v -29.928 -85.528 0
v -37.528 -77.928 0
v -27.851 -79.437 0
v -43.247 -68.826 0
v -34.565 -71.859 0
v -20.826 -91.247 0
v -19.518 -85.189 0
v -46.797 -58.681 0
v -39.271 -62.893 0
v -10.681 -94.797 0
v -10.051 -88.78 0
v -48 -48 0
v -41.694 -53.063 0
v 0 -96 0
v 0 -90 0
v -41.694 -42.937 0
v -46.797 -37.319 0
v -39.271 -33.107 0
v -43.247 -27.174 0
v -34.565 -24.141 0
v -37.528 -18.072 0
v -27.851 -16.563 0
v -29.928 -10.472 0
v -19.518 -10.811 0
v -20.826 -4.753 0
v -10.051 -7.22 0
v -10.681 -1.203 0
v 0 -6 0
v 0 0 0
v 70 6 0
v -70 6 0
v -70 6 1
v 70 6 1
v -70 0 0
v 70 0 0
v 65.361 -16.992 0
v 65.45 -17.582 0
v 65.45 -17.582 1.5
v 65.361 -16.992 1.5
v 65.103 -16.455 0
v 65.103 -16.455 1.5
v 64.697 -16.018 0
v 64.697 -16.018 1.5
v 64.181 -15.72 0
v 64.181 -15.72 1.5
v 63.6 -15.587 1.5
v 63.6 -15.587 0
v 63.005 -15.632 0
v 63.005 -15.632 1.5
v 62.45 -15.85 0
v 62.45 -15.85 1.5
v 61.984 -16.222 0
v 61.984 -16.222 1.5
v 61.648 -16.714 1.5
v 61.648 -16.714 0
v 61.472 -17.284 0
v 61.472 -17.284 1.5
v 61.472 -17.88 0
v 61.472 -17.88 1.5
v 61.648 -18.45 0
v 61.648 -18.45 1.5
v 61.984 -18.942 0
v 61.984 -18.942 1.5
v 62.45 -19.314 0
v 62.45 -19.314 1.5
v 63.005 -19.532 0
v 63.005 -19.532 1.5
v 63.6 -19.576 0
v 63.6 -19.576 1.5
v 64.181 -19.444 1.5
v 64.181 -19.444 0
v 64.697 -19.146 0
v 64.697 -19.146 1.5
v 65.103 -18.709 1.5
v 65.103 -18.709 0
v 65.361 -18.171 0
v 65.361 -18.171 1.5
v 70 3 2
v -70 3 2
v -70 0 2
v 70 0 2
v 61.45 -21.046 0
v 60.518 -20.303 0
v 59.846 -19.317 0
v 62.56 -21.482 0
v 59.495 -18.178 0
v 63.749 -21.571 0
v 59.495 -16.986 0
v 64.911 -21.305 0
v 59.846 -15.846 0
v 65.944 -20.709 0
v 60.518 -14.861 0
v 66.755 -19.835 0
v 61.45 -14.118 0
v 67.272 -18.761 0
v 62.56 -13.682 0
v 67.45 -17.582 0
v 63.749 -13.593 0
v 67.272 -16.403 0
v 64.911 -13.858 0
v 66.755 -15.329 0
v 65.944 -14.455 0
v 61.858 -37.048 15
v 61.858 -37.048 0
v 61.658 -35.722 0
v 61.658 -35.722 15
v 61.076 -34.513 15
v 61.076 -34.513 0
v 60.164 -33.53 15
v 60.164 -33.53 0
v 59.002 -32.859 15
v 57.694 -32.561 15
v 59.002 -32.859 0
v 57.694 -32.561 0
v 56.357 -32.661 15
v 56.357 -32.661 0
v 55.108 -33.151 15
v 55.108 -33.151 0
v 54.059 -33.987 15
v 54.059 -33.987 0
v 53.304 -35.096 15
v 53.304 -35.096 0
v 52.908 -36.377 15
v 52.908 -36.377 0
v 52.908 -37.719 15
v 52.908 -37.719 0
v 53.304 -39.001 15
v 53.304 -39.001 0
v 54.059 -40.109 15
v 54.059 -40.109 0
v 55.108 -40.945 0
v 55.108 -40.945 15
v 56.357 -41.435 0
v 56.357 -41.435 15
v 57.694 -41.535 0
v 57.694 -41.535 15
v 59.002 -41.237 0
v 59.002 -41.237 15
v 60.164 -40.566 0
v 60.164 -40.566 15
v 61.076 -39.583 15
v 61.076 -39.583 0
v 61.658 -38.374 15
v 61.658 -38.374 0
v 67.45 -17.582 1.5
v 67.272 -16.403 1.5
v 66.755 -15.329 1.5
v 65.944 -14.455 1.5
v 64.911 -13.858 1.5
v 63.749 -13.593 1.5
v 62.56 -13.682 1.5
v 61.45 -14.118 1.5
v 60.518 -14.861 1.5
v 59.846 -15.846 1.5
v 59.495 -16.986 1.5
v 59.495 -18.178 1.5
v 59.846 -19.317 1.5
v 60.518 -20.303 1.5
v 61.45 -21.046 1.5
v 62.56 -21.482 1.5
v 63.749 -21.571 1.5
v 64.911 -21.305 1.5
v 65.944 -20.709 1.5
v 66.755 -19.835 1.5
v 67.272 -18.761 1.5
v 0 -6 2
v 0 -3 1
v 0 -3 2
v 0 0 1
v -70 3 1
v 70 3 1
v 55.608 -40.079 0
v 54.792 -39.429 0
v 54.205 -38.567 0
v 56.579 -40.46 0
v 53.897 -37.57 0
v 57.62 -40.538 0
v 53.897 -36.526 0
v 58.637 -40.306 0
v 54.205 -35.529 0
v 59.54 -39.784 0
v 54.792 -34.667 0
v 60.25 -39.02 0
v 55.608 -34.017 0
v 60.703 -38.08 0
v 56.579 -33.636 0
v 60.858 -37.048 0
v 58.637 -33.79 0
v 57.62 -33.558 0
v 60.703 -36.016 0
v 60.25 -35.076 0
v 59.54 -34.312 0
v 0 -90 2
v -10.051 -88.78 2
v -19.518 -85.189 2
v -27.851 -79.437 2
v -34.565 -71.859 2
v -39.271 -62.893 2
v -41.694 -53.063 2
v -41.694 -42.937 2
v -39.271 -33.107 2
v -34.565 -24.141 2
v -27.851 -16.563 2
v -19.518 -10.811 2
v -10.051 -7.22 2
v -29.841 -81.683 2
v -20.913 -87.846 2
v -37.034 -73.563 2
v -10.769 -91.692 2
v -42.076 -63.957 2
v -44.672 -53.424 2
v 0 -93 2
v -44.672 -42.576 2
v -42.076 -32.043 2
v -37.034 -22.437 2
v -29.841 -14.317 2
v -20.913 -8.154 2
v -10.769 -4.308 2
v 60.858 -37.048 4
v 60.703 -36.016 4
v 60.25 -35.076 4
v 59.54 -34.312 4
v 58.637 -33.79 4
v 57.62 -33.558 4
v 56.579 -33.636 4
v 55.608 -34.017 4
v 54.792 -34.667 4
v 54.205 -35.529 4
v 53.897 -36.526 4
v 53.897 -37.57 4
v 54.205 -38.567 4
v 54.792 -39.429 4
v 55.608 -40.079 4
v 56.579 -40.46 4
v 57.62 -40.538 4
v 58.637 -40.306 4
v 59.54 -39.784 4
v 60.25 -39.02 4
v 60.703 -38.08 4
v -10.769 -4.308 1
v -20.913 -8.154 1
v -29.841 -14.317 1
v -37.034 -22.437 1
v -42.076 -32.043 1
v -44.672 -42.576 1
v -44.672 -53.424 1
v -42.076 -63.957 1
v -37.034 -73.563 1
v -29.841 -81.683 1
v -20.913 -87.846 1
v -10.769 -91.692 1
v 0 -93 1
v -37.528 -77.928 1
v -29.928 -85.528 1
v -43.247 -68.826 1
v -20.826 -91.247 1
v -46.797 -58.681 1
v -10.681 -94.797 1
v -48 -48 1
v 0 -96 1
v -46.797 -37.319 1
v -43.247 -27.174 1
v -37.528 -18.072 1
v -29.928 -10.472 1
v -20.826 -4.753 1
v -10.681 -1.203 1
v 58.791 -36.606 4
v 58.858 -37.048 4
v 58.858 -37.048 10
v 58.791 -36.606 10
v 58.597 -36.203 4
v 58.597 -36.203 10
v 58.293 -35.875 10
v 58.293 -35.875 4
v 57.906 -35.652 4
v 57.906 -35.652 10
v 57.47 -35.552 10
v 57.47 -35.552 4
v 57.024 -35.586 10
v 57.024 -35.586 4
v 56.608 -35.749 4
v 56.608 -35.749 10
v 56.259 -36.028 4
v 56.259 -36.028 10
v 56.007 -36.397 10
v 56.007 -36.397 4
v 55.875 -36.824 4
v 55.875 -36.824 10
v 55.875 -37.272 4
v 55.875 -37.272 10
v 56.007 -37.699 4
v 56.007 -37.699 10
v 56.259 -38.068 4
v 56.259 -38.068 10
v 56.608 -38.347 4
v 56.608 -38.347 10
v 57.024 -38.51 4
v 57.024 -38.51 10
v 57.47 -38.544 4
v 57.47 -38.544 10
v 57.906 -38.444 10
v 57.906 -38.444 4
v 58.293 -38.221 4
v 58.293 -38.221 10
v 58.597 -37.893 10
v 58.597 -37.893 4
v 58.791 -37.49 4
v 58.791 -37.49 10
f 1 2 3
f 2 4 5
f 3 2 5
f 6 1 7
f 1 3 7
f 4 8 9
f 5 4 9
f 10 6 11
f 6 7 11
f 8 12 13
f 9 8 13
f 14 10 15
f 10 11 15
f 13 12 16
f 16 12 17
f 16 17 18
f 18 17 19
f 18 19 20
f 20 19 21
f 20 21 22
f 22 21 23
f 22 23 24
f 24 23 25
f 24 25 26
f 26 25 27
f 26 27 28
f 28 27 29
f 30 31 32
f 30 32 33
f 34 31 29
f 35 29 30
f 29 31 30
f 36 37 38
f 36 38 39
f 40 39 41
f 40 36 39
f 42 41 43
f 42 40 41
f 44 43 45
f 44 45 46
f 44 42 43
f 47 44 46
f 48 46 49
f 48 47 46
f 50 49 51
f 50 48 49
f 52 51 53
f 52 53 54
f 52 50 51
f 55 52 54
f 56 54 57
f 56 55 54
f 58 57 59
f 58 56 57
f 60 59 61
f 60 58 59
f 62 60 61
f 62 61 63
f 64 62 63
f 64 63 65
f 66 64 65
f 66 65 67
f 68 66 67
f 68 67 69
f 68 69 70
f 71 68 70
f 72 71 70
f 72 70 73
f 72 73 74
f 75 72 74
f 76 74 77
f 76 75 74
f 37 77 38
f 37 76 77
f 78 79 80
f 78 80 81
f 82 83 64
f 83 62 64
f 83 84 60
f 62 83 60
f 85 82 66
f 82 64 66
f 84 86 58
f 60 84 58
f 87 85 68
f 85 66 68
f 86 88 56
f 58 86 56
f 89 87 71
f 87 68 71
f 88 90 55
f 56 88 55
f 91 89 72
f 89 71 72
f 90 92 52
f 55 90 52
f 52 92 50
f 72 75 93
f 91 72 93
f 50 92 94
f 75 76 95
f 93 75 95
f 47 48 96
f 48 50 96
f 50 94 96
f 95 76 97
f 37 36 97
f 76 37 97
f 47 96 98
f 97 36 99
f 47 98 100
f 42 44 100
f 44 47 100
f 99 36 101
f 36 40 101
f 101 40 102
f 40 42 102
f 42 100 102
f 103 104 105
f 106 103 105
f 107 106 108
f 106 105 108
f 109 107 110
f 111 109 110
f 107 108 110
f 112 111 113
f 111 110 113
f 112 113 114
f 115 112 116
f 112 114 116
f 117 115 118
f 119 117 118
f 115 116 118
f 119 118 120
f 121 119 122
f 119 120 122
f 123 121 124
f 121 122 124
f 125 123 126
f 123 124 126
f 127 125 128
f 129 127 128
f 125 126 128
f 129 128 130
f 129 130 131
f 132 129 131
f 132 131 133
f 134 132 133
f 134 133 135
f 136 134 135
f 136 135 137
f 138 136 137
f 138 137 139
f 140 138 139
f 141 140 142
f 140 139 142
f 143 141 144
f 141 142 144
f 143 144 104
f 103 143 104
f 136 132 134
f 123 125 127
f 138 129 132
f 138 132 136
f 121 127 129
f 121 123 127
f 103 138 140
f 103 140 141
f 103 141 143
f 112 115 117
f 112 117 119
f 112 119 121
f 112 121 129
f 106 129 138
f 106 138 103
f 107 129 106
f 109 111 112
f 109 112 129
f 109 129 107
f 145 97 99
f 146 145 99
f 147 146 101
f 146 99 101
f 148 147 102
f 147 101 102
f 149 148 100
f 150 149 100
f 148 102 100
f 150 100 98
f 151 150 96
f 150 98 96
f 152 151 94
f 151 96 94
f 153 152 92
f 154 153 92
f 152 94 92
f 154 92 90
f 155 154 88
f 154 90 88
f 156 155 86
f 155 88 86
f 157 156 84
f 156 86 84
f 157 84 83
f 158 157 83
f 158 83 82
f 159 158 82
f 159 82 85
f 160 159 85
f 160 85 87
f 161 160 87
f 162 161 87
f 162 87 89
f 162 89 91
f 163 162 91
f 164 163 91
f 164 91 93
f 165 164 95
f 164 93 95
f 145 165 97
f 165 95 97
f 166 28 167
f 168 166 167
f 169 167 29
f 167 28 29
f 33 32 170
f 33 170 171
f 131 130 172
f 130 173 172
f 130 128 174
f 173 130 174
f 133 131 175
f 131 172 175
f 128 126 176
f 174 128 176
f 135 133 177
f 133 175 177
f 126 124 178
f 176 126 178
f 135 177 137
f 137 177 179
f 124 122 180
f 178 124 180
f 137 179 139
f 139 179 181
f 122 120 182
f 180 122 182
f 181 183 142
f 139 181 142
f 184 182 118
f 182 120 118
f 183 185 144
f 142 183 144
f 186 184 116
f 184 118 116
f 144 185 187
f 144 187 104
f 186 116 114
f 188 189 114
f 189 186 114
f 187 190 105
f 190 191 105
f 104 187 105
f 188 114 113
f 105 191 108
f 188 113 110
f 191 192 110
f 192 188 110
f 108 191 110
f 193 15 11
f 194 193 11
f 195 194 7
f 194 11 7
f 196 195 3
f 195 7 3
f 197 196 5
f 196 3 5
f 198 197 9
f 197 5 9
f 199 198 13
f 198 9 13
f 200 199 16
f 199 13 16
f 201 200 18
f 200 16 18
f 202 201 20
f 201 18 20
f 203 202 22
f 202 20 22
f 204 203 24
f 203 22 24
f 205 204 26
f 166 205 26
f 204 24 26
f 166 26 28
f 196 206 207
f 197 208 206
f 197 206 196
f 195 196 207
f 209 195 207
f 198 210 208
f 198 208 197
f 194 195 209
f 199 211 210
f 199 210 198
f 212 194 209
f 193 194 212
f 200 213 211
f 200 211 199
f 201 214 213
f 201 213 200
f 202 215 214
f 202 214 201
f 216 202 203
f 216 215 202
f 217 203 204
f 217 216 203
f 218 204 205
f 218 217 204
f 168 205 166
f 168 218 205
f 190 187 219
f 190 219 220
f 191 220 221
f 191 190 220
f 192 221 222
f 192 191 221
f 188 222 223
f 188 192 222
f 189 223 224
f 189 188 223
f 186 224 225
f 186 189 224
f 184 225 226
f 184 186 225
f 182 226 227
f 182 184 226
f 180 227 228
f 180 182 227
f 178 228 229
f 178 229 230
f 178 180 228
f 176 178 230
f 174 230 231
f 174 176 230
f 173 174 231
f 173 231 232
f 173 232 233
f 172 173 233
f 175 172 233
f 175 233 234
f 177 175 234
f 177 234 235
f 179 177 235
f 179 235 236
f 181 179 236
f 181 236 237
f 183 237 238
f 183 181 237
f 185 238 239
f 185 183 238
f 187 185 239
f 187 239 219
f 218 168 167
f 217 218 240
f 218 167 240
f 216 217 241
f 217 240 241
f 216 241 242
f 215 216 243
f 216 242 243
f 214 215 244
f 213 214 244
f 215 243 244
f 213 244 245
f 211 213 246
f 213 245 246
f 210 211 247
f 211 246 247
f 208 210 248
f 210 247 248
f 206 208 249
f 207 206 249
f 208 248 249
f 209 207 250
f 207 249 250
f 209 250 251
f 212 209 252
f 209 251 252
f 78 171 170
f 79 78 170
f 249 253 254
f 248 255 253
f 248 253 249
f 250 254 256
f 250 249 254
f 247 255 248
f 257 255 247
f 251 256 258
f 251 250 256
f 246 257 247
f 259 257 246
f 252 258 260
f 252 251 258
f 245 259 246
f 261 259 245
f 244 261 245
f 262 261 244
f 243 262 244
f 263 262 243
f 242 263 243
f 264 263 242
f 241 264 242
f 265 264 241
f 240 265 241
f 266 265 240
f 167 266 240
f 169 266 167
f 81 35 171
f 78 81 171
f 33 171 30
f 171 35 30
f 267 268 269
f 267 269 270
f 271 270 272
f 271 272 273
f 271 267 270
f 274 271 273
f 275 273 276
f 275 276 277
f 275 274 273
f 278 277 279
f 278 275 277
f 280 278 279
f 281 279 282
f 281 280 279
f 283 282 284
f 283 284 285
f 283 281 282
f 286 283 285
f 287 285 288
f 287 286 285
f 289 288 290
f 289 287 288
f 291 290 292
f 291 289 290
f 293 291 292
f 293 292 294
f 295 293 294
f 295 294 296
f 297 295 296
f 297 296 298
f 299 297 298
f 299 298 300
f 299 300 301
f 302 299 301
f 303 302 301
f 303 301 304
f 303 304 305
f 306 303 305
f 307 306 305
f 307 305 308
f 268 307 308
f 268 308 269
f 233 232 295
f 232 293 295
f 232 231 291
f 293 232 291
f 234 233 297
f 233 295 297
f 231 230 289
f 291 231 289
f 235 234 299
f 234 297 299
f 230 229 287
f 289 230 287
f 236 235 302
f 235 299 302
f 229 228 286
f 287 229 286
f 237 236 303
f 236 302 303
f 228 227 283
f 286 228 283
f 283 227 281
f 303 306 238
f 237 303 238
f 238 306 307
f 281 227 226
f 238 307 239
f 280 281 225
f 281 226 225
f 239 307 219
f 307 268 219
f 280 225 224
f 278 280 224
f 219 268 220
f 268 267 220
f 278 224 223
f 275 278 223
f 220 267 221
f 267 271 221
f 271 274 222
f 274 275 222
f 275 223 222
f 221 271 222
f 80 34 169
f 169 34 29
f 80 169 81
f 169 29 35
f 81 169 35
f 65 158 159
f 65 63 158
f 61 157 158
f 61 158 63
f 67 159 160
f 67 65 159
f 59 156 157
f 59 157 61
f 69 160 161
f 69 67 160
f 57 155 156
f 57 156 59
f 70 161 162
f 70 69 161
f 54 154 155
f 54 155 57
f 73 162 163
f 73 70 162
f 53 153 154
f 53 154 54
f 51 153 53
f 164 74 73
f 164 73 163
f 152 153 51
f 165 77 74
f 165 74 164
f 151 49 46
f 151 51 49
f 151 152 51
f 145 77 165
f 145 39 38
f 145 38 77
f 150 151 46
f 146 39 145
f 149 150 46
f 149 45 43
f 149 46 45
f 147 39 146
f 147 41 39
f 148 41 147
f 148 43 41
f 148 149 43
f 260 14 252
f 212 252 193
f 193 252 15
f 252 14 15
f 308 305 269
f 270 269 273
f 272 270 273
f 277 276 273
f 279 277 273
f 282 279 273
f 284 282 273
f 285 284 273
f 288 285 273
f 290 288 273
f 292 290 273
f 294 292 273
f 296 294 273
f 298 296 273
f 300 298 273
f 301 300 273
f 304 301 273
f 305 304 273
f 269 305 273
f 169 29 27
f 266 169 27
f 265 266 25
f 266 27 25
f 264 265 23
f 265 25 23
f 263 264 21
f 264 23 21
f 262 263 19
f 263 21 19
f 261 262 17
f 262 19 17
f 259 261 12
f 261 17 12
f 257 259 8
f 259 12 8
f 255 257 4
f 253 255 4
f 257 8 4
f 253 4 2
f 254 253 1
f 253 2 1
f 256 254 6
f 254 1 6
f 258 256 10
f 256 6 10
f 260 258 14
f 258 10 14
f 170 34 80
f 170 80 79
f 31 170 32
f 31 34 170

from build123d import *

# Parameters (mm, degrees)
F1_DEPTH = 2
F0_W     = 140
F0_H     = 3
F2_DEPTH = 1
F0_R     = 4
F0_R_2   = 2
F3_DEPTH = 1.5
F0_R_3   = 4.5
F0_R_4   = 3.5
F0_R_5   = 1.5
F4_DEPTH = 15
F5_DEPTH = 10
F6_DEPTH = 4


with BuildPart() as f1:
    # F0 (on Top) → F1 (new body)
    with BuildSketch(Plane.XY):
        Polygon((-70, 3), (-70, 0), (0, 0), (70, 0), (70, 3), align=None)
    extrude(amount=F1_DEPTH)



with BuildPart() as f1b:
    # F0 (on Top) → F1, piece 2 (new body)
    with BuildSketch(Plane.XY):
        with BuildLine():
            Line((0, -6), (0, -3))
            ThreePointArc((0, -3), (-45, -48), (0, -93))
            Line((0, -93), (0, -90))
            ThreePointArc((0, -90), (-42, -48), (0, -6))
        make_face()
    extrude(amount=F1_DEPTH)


with BuildPart() as f1_1:
    add(f1.part)

    add(f1b.part)  # F2 merges F1b
    # F0 (on Top) → F2 (join)
    with BuildSketch(Plane.XY):
        with Locations((0, 4.5)):
            Rectangle(F0_W, F0_H)
        with BuildLine():
            Line((0, -3), (0, 0))
            ThreePointArc((0, 0), (-48, -48), (0, -96))
            Line((0, -96), (0, -93))
            ThreePointArc((0, -93), (-45, -48), (0, -3))
        make_face()
    extrude(amount=F2_DEPTH)


with BuildPart() as f3:
    # F0 (on Top) → F3 (new body)
    with BuildSketch(Plane.XY):
        with Locations((63.45012784, -17.581872642)):
            Circle(F0_R)
        with Locations((63.45012784, -17.581872642)):
            Circle(F0_R_2, mode=Mode.SUBTRACT)
    extrude(amount=F3_DEPTH)


with BuildPart() as f4:
    # F0 (on Top) → F4 (new body)
    with BuildSketch(Plane.XY):
        with Locations((57.3580823839, -37.0480269194)):
            Circle(F0_R_3)
        with Locations((57.3580823839, -37.0480269194)):
            Circle(F0_R_4, mode=Mode.SUBTRACT)
        with Locations((57.3580823839, -37.0480269194)):
            Circle(F0_R_4)
        with Locations((57.3580823839, -37.0480269194)):
            Circle(F0_R_5, mode=Mode.SUBTRACT)
        with Locations((57.3580823839, -37.0480269194)):
            Circle(F0_R_5)
    extrude(amount=F4_DEPTH)

    # F0 (on Top) → F5 (cut)
    with BuildSketch(Plane.XY):
        with Locations((57.3580823839, -37.0480269194)):
            Circle(F0_R_5)
    extrude(amount=F5_DEPTH, mode=Mode.SUBTRACT)

    # F0 (on Top) → F6 (cut)
    with BuildSketch(Plane.XY):
        with Locations((57.3580823839, -37.0480269194)):
            Circle(F0_R_4)
        with Locations((57.3580823839, -37.0480269194)):
            Circle(F0_R_5, mode=Mode.SUBTRACT)
    extrude(amount=F6_DEPTH, mode=Mode.SUBTRACT)


solid = Compound([f1_1.part, f3.part, f4.part])
